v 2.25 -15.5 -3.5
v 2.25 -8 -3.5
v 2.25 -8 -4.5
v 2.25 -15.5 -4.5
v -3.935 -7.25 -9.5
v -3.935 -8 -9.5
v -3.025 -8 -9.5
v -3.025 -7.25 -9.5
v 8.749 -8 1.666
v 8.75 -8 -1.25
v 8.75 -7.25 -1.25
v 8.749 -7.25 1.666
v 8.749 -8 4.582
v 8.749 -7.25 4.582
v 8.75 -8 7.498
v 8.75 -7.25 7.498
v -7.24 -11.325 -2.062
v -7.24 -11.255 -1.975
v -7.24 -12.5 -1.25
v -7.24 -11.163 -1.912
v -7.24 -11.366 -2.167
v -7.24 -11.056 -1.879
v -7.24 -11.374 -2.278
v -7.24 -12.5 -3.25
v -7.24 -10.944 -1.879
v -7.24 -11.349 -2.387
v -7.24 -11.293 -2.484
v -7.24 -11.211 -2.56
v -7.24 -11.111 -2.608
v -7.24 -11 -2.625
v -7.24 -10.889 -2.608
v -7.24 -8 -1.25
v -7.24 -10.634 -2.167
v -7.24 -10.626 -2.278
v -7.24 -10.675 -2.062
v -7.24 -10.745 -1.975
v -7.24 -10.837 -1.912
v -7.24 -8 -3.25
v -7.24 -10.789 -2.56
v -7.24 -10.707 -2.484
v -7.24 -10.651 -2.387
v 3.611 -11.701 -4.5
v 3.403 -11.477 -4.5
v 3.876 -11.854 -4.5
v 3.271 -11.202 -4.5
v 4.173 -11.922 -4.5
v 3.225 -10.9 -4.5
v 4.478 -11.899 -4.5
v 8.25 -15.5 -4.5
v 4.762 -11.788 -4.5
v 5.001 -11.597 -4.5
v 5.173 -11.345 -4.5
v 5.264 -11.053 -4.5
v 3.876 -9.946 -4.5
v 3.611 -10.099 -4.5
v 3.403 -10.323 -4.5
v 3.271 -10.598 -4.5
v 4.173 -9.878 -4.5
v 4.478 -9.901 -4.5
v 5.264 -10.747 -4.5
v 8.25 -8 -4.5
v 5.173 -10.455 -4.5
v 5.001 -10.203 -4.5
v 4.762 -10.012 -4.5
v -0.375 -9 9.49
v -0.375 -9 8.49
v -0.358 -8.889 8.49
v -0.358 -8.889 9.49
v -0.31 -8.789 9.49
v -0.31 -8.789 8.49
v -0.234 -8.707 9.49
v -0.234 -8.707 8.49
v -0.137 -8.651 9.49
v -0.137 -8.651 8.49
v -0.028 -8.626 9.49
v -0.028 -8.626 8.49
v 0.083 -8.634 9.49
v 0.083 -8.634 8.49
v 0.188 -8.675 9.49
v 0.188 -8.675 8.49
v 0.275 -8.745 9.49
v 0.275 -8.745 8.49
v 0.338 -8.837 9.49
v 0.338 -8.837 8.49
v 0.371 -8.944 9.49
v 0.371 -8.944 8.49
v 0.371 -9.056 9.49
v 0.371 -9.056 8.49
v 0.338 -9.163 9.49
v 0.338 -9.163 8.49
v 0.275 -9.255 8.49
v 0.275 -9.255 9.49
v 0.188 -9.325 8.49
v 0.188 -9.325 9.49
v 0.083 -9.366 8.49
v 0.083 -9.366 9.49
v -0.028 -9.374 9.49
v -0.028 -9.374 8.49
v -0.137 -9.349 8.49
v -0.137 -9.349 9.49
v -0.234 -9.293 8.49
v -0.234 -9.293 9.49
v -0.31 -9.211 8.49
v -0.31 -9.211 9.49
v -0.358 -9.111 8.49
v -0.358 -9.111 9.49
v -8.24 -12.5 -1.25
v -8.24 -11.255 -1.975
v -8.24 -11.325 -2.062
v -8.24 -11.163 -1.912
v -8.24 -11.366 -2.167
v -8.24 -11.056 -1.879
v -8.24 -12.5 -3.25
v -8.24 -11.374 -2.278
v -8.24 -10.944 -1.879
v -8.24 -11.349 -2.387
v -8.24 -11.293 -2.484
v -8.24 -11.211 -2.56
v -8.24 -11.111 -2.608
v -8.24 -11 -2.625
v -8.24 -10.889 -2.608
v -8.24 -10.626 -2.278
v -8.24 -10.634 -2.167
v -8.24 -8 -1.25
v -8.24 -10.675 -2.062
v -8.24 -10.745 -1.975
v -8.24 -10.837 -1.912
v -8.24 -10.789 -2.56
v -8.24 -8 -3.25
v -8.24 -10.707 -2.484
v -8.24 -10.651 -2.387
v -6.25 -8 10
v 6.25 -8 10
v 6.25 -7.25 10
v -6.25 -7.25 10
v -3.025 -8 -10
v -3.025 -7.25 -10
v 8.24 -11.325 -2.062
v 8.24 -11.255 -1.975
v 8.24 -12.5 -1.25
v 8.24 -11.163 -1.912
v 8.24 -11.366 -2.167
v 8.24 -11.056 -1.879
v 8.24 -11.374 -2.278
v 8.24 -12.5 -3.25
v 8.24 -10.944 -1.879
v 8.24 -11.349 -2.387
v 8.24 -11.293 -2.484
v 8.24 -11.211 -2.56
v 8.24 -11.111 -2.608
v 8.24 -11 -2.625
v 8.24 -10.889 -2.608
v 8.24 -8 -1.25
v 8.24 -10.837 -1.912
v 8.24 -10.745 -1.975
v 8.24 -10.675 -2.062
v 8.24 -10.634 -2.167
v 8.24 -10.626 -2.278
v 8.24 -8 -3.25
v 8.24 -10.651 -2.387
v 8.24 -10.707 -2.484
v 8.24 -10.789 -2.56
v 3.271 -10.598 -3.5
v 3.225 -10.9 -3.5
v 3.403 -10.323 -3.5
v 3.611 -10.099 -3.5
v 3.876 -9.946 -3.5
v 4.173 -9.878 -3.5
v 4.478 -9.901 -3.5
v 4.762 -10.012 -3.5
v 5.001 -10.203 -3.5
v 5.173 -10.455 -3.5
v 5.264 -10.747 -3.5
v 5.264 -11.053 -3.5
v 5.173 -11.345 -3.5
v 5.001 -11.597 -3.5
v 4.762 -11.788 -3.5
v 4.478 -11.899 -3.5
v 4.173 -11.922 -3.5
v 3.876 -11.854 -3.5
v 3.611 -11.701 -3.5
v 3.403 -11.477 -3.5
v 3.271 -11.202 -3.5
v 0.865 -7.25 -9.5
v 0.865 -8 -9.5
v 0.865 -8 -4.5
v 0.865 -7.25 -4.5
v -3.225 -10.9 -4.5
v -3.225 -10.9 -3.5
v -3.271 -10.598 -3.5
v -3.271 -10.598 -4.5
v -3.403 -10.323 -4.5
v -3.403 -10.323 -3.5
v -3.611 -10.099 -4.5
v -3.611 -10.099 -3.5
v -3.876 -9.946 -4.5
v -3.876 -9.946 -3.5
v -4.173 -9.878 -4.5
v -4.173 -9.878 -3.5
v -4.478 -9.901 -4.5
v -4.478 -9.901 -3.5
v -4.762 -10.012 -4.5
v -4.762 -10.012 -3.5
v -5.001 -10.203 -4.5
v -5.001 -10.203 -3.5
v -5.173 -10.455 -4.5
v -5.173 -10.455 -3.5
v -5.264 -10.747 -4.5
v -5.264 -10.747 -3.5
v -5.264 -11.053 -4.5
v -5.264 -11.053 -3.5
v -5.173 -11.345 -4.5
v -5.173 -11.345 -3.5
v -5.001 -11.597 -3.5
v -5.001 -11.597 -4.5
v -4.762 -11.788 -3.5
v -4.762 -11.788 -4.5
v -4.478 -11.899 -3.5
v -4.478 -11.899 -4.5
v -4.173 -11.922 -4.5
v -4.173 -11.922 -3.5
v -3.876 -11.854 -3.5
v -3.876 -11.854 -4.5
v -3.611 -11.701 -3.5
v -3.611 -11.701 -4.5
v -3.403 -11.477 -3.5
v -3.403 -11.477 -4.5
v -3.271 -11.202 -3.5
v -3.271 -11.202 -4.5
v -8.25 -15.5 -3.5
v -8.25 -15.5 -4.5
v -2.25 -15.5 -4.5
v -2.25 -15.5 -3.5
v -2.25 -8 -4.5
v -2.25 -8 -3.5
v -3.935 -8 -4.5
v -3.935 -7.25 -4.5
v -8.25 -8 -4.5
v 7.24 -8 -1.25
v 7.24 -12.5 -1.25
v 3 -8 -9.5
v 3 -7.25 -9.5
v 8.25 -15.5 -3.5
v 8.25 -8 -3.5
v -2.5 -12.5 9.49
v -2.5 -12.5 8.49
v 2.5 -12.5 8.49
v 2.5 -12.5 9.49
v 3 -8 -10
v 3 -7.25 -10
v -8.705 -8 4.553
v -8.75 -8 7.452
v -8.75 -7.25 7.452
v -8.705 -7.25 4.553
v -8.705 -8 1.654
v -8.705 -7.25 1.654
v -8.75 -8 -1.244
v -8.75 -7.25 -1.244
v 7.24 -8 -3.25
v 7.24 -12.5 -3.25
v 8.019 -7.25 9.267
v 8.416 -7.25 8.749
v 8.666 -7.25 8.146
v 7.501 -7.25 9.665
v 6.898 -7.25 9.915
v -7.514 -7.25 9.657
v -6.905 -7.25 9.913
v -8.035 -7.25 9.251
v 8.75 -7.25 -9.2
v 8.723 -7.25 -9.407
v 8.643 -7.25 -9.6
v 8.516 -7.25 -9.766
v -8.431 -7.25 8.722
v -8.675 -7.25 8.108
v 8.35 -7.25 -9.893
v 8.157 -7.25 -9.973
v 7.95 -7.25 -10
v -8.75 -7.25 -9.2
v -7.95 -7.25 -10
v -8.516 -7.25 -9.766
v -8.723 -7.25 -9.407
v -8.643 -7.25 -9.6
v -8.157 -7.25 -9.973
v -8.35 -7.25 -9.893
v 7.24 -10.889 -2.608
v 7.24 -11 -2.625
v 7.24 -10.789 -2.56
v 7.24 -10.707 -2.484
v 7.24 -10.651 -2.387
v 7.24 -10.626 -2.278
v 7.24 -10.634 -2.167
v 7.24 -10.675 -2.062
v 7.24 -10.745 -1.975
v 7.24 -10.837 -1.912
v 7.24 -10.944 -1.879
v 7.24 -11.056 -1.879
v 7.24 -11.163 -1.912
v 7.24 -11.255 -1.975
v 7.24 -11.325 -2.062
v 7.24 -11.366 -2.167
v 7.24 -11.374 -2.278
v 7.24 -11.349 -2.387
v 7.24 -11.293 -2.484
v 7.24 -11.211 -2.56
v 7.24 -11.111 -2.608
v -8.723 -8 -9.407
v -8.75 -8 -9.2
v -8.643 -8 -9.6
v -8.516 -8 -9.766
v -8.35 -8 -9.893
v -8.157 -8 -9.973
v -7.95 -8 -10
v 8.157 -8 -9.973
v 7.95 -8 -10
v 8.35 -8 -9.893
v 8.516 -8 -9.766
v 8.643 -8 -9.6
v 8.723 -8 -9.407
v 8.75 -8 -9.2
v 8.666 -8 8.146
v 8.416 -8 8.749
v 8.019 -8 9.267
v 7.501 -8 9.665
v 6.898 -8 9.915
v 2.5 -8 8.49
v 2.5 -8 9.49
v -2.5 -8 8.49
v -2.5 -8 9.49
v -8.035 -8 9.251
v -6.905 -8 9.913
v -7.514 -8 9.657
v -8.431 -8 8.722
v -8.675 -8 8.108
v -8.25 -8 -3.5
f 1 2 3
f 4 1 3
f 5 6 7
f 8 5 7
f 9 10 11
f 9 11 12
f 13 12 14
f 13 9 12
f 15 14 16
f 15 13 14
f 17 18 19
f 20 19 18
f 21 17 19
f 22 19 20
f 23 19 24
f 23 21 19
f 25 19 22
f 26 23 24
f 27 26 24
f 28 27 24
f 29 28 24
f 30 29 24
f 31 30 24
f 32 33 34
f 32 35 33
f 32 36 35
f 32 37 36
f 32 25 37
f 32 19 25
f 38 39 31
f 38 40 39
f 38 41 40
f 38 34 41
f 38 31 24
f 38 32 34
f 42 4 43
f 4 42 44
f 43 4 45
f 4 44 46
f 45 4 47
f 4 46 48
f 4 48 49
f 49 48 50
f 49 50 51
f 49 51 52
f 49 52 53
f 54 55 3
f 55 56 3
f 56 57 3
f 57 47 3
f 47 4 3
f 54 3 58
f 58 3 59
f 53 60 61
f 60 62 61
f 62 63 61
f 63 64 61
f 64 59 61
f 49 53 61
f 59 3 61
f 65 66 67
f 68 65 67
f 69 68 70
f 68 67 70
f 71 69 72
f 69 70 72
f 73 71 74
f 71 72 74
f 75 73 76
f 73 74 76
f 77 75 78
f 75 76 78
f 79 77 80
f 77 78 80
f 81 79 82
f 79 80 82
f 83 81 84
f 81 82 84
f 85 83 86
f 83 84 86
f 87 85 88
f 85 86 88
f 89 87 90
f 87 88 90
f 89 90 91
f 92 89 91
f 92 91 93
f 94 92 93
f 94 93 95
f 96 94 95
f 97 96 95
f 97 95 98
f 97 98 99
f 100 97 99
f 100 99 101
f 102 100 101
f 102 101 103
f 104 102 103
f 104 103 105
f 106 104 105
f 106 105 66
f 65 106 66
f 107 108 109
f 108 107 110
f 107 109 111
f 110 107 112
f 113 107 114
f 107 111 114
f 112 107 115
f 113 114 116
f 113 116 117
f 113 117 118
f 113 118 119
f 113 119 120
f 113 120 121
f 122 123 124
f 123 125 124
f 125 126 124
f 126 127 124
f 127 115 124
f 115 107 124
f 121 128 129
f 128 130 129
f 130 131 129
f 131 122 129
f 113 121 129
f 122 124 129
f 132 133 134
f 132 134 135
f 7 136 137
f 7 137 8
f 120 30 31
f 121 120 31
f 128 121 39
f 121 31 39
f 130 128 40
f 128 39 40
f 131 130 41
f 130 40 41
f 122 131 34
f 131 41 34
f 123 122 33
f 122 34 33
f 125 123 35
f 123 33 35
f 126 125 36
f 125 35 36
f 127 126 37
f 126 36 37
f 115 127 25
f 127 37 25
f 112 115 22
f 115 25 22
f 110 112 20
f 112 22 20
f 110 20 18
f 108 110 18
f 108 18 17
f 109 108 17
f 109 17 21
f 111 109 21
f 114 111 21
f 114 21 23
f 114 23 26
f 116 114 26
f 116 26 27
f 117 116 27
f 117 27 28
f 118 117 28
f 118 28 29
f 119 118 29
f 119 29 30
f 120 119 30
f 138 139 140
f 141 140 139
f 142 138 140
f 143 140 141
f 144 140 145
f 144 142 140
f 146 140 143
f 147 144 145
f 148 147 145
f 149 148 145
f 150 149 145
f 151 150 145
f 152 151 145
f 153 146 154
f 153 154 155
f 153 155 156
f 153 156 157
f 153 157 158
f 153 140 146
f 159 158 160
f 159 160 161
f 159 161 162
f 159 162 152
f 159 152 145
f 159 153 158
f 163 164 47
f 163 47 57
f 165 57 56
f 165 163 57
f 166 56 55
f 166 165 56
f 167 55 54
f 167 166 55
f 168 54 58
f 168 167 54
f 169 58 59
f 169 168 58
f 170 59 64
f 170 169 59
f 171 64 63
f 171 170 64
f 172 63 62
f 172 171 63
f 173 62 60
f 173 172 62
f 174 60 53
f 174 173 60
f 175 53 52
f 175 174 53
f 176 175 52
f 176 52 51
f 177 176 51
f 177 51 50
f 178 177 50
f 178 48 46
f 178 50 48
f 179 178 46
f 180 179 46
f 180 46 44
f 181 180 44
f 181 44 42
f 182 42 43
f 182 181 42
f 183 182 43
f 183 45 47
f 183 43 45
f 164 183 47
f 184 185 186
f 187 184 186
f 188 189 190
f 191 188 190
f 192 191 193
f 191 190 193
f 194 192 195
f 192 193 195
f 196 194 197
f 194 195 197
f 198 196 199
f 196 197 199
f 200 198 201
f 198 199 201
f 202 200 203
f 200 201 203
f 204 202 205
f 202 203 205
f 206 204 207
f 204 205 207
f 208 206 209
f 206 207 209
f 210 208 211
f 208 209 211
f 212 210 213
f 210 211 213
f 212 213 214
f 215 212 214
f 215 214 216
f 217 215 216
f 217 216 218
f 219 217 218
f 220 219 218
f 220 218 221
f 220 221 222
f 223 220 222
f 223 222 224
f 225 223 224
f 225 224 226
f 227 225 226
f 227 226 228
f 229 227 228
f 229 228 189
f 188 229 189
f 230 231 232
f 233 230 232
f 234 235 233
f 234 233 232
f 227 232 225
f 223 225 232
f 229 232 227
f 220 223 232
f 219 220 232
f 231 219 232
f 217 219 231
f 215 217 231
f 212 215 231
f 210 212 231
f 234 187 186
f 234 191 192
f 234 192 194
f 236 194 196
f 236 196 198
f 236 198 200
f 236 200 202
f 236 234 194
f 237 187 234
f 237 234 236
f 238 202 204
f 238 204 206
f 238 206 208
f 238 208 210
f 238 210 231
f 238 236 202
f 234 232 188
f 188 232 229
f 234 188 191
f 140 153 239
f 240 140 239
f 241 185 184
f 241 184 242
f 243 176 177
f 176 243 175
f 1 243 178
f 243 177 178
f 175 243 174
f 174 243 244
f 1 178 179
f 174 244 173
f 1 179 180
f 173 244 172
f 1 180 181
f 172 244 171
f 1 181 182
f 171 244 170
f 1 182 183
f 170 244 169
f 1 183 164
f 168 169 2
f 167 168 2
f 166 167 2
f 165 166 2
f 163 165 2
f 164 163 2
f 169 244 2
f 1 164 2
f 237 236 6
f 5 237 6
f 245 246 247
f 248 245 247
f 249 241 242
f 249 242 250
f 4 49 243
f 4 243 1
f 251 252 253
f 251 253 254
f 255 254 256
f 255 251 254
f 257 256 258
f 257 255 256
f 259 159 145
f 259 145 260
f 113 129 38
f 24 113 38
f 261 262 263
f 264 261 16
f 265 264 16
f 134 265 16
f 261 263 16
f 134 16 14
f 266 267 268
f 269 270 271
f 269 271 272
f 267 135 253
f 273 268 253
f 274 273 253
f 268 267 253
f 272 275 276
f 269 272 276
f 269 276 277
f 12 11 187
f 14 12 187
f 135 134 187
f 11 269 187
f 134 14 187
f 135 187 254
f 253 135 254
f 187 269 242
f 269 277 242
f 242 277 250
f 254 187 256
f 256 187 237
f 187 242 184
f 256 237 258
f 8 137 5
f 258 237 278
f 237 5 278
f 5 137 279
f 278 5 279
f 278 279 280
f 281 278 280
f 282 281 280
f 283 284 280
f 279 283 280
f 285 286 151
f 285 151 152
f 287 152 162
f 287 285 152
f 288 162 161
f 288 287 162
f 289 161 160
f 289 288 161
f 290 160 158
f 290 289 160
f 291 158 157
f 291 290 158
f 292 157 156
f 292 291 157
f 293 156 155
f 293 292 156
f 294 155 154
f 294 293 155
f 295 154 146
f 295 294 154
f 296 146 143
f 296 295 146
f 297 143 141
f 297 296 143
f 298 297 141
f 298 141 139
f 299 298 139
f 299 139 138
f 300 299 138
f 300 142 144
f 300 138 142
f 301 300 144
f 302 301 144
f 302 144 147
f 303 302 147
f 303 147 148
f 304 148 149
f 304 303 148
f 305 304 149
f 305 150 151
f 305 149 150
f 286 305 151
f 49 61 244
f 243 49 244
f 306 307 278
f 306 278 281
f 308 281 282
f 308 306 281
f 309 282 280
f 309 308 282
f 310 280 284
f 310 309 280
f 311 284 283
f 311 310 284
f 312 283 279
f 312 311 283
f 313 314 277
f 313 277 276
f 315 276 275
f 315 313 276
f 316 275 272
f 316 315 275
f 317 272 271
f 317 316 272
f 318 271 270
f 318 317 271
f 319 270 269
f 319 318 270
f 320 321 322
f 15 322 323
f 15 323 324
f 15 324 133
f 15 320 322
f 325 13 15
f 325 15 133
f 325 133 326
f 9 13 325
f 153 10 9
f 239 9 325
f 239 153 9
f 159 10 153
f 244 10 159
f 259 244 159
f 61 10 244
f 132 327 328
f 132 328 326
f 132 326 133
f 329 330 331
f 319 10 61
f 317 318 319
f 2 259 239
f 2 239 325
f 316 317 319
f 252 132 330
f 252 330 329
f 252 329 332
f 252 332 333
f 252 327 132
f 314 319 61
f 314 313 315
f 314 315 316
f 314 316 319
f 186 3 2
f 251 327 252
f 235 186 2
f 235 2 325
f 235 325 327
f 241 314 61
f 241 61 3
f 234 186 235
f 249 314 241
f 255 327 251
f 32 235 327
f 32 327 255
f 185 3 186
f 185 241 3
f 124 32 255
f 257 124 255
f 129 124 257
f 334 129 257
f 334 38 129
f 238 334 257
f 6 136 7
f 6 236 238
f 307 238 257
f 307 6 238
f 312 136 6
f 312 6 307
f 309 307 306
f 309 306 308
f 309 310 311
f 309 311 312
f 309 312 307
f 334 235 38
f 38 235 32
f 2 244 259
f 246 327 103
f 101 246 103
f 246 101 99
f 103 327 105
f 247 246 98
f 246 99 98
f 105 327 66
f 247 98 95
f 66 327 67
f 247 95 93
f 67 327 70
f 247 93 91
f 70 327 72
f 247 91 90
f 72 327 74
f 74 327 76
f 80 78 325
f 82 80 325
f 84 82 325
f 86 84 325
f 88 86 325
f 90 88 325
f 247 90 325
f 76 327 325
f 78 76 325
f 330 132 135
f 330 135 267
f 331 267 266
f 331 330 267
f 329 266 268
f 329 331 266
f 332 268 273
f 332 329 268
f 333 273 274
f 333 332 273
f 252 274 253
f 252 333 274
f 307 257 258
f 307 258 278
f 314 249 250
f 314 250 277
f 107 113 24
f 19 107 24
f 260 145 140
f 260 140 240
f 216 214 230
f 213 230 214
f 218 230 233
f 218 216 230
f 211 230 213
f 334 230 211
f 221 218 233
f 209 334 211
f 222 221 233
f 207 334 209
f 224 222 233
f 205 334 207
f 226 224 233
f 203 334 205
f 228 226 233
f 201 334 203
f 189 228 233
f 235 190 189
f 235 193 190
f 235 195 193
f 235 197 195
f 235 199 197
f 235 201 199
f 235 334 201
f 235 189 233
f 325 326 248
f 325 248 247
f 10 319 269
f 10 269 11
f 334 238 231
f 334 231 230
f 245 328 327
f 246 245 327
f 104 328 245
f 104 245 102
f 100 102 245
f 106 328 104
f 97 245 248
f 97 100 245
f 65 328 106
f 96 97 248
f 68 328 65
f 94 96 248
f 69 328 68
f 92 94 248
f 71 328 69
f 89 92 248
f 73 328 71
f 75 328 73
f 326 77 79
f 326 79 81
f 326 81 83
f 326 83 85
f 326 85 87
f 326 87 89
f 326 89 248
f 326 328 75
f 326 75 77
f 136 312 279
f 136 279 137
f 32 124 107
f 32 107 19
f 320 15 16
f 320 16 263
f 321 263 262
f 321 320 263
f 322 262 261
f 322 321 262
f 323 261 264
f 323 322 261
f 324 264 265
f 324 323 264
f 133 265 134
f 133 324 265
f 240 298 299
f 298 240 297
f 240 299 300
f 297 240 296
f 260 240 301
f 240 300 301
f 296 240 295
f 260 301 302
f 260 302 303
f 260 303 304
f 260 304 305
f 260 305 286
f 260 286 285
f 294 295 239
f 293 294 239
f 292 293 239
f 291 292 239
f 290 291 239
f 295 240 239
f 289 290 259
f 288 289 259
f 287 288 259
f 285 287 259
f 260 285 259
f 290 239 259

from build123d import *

# Parameters (mm, degrees)
EXTRUDE_LID_MAIN_DEPTH = 0.75
EXTRUDE_THIN2_DEPTH    = 0.75
UPPER_17_W             = 5
UPPER_17_H             = 1
UPPER_17_W_2           = 1
UPPER_17_H_2           = 2
LID_ANCHOR_FRONT_DEPTH = 4.5
TAP_LATERAL_LID_D      = 0.75
TAP_FRONT_LID_D        = 0.75
CUT_EXTRUDE1_REACH     = 16.029
HS_HOLDER_LID_DEPTH    = 7.5
M2_5_TAPPED_HOLE2_D    = 2.05


with BuildPart() as part:
    # upper<13> → extrude_lid_main (new body)
    with BuildSketch(Plane(origin=(0, -8, 0), x_dir=(1, 0, 0), z_dir=(0, 1, 0))):
        with BuildLine():
            Line((-6.250353693, -9.5), (6.250353693, -9.5))
            ThreePointArc((6.250353693, -9.5), (7.665029031, -8.913751636), (8.250353267, -7.498693688))
            ThreePointArc((8.250353267, -7.498693688), (8.248836384, -3.124346898), (8.25, 1.25))
            Line((8.25, 1.25), (8.25, 9.2))
            ThreePointArc((8.25, 9.2), (8.162132034, 9.412132034), (7.95, 9.5))
            Line((7.95, 9.5), (0.865, 9.5))
            Line((0.865, 9.5), (0.865, 4.5))
            Line((0.865, 4.5), (-3.935, 4.5))
            Line((-3.935, 4.5), (-3.935, 9.5))
            Line((-3.935, 9.5), (-7.95, 9.5))
            ThreePointArc((-7.95, 9.5), (-8.162132034, 9.412132034), (-8.25, 9.2))
            Line((-8.25, 9.2), (-8.25, 1.25))
            ThreePointArc((-8.25, 1.25), (-8.199296345, -3.106194095), (-8.25, -7.462388189))
            ThreePointArc((-8.25, -7.462388189), (-7.677803101, -8.900852665), (-6.250353693, -9.5))
        make_face()
    extrude(amount=EXTRUDE_LID_MAIN_DEPTH)



with BuildPart() as body_2:
    # upper<16> → Extrude-Thin2 (new body)
    with BuildSketch(Plane(origin=(0, -8, 0), x_dir=(1, 0, 0), z_dir=(0, 1, 0))):
        with BuildLine():
            Line((-8.75, 1.244176388), (-8.75, 9.2))
            ThreePointArc((-8.75, 9.2), (-8.515685425, 9.765685425), (-7.95, 10))
            Line((-7.95, 10), (7.95, 10))
            ThreePointArc((7.95, 10), (8.515685425, 9.765685425), (8.75, 9.2))
            Line((8.75, 9.2), (8.75, 1.249856897))
            ThreePointArc((8.75, 1.249856897), (8.748836381, -3.12425516), (8.75035316, -7.49836711))
            ThreePointArc((8.75035316, -7.49836711), (8.018697866, -9.267189545), (6.250353693, -10))
            Line((6.250353693, -10), (-6.250353693, -10))
            ThreePointArc((-6.250353693, -10), (-8.035078913, -9.250644422), (-8.749889093, -7.451804713))
            ThreePointArc((-8.749889093, -7.451804713), (-8.69929636, -3.103813517), (-8.75, 1.244176388))
        make_face()
        with BuildLine():
            Line((-8.25, 1.25), (-8.25, 9.2))
            ThreePointArc((-8.25, 9.2), (-8.162132034, 9.412132034), (-7.95, 9.5))
            Line((-7.95, 9.5), (7.95, 9.5))
            ThreePointArc((7.95, 9.5), (8.162132034, 9.412132034), (8.25, 9.2))
            Line((8.25, 9.2), (8.25, 1.25))
            ThreePointArc((8.25, 1.25), (8.248836384, -3.124346898), (8.250353267, -7.498693688))
            ThreePointArc((8.250353267, -7.498693688), (7.665029031, -8.913751636), (6.250353693, -9.5))
            Line((6.250353693, -9.5), (-6.250353693, -9.5))
            ThreePointArc((-6.250353693, -9.5), (-7.677803101, -8.900852665), (-8.25, -7.462388189))
            ThreePointArc((-8.25, -7.462388189), (-8.199296345, -3.106194095), (-8.25, 1.25))
        make_face(mode=Mode.SUBTRACT)
    extrude(amount=EXTRUDE_THIN2_DEPTH)


with BuildPart() as part_1:
    add(part.part)

    add(body_2.part)  # lid_anchor_front merges body 2
    # upper<17> → lid_anchor_front (add)
    with BuildSketch(Plane(origin=(0, -8, 0), x_dir=(1, 0, 0), z_dir=(0, 1, 0))):
        with Locations((0, -8.99)):
            Rectangle(UPPER_17_W, UPPER_17_H)
        with Locations((-7.74, 2.25)):
            Rectangle(UPPER_17_W_2, UPPER_17_H_2)
    lid_anchor_front = extrude(amount=-LID_ANCHOR_FRONT_DEPTH)

    # tap_lateral_lid (through all)
    with Locations(Plane.ZY.offset(8.24)):
        with Locations((-2.25, -11)):
            tap_lateral_lid = Hole(TAP_LATERAL_LID_D / 2)

    # Mirror3: lid_anchor_front, tap_lateral_lid across plane
    add(lid_anchor_front.mirror(Plane(origin=(0, 0, 0), x_dir=(0, 0, 1), z_dir=(1, 0, 0))))
    add(tap_lateral_lid.mirror(Plane(origin=(0, 0, 0), x_dir=(0, 0, 1), z_dir=(1, 0, 0))), mode=Mode.SUBTRACT)

    # tap_front_lid (through all)
    with Locations(Plane.XY.offset(9.49)):
        with Locations((0, -9)):
            Hole(TAP_FRONT_LID_D / 2)

    # upper<18> → Cut-Extrude1 (cut, up to next)
    with BuildSketch(Plane(origin=(0, -8, 0), x_dir=(1, 0, 0), z_dir=(0, 1, 0)), mode=Mode.PRIVATE) as cut_extrude1_sk1:
        with BuildLine():
            ThreePointArc((-2.5, 9.5), (-1.767766953, 11.267766953), (0, 12))
            Line((0, 12), (-1.556624327, 12))
            Line((-1.556624327, 12), (-3, 9.5))
            Line((-3, 9.5), (-2.5, 9.5))
        make_face()
    cut_extrude1_tool1 = extrude(cut_extrude1_sk1.sketch, amount=CUT_EXTRUDE1_REACH, mode=Mode.PRIVATE) & part_1.part
    # upper<18> → Cut-Extrude1 (cut, up to next)
    with BuildSketch(Plane(origin=(0, -8, 0), x_dir=(1, 0, 0), z_dir=(0, 1, 0)), mode=Mode.PRIVATE) as cut_extrude1_sk2:
        with BuildLine():
            Line((2.5, 9.5), (3, 9.5))
            Line((3, 9.5), (1.556624327, 12))
            Line((1.556624327, 12), (0, 12))
            ThreePointArc((0, 12), (1.767766953, 11.267766953), (2.5, 9.5))
        make_face()
    cut_extrude1_tool2 = extrude(cut_extrude1_sk2.sketch, amount=CUT_EXTRUDE1_REACH, mode=Mode.PRIVATE) & part_1.part
    # upper<18> → Cut-Extrude1 (cut, up to next)
    with BuildSketch(Plane(origin=(0, -8, 0), x_dir=(1, 0, 0), z_dir=(0, 1, 0)), mode=Mode.PRIVATE) as cut_extrude1_sk3:
        with BuildLine():
            Line((1.25, 9.5), (2.5, 9.5))
            ThreePointArc((2.5, 9.5), (1.767766953, 11.267766953), (0, 12))
            ThreePointArc((0, 12), (-1.767766953, 11.267766953), (-2.5, 9.5))
            Line((-2.5, 9.5), (-1.25, 9.5))
            Line((-1.25, 9.5), (0.865, 9.5))
            Line((0.865, 9.5), (1.25, 9.5))
        make_face()
    cut_extrude1_tool3 = extrude(cut_extrude1_sk3.sketch, amount=CUT_EXTRUDE1_REACH, mode=Mode.PRIVATE) & part_1.part
    # upper<18> → Cut-Extrude1 (cut, up to next)
    with BuildSketch(Plane(origin=(0, -8, 0), x_dir=(1, 0, 0), z_dir=(0, 1, 0)), mode=Mode.PRIVATE) as cut_extrude1_sk4:
        Polygon((1.556624327, 12), (3, 9.5), (3, 12), align=None)
    cut_extrude1_tool4 = extrude(cut_extrude1_sk4.sketch, amount=CUT_EXTRUDE1_REACH, mode=Mode.PRIVATE) & part_1.part
    # upper<18> → Cut-Extrude1 (cut, up to next)
    with BuildSketch(Plane(origin=(0, -8, 0), x_dir=(1, 0, 0), z_dir=(0, 1, 0)), mode=Mode.PRIVATE) as cut_extrude1_sk5:
        Polygon((-3, 9.5), (-1.556624327, 12), (-3.025026025, 12), (-3.025026025, 9.5), align=None)
    cut_extrude1_tool5 = extrude(cut_extrude1_sk5.sketch, amount=CUT_EXTRUDE1_REACH, mode=Mode.PRIVATE) & part_1.part
    add(cut_extrude1_tool1.solids().sort_by_distance((-2.75, -8, -9.539051))[0], mode=Mode.SUBTRACT)
    add(cut_extrude1_tool2.solids().sort_by_distance((2.244493, -8, -10.730474))[0], mode=Mode.SUBTRACT)
    add(cut_extrude1_tool3.solids().sort_by_distance((0, -8, -10.561033))[0], mode=Mode.SUBTRACT)
    add(cut_extrude1_tool4.solids().sort_by_distance((2.518875, -8, -11.166667))[0], mode=Mode.SUBTRACT)
    add(cut_extrude1_tool5.solids().sort_by_distance((-2.535419, -8, -11.152702))[0], mode=Mode.SUBTRACT)

    # upper<25> → hs-holder-lid (add)
    with BuildSketch(Plane(origin=(0, -8, 0), x_dir=(1, 0, 0), z_dir=(0, 1, 0))):
        Polygon((-8.25, 4.5), (-8.25, 3.5), (-2.25, 3.5), (-2.25, 4.5), (-3.935, 4.5), (-4.75, 4.5), align=None)
    hs_holder_lid = extrude(amount=-HS_HOLDER_LID_DEPTH)

    # M2.5 Tapped Hole2 (through all)
    with Locations(Plane(origin=(0, 0, -4.5), x_dir=(-1, 0, 0), z_dir=(0, 0, -1))):
        with Locations((4.25, -10.9)):
            m2_5_tapped_hole2 = Hole(M2_5_TAPPED_HOLE2_D / 2)

    # Mirror6: hs-holder-lid across plane
    add(hs_holder_lid.mirror(Plane(origin=(0, 0, 0), x_dir=(0, 0, 1), z_dir=(1, 0, 0))))

    # Mirror7: M2.5 Tapped Hole2 across plane
    add(m2_5_tapped_hole2.mirror(Plane(origin=(0, 0, 0), x_dir=(0, 0, 1), z_dir=(1, 0, 0))), mode=Mode.SUBTRACT)


solid = part_1.part
